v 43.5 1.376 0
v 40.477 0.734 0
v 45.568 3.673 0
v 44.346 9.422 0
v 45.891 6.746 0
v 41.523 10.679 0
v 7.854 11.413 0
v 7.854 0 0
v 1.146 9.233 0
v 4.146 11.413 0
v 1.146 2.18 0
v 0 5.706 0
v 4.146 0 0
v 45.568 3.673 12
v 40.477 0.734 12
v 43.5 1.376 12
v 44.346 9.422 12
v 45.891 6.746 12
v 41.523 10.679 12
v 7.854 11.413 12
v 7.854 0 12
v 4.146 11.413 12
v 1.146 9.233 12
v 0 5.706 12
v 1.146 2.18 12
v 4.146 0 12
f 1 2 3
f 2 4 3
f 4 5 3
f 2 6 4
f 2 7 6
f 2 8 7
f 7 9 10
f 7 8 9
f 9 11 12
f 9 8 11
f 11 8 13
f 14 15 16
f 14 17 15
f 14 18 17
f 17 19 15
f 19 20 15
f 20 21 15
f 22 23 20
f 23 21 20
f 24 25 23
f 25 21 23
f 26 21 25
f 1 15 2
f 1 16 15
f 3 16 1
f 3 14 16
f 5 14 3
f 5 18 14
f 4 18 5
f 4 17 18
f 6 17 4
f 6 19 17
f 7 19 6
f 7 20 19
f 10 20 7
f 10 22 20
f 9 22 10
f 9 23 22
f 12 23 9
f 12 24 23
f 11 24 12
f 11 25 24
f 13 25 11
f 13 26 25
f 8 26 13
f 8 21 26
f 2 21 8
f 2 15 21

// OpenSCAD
$fn = 32;

// ----------------------------------------------------------------------
// Lever arm: two bosses 12 and 10 mm, 35 mm between centres
// ----------------------------------------------------------------------

// --- parameters (mm) ---
profile_height = 12;      // extrusion height
profile_points = 13;      // points of the closed outline

profile = [[0, 5.706], [1.146, 2.18], [4.146, 0], [7.854, 0], [40.477, 0.734], [43.5, 1.376], [45.568, 3.673], [45.891, 6.746], [44.346, 9.422], [41.523, 10.679], [7.854, 11.413], [4.146, 11.413], [1.146, 9.233]];  // single closed polygon, 13 points, counter clockwise

// --- the one profile operation ---
linear_extrude(height = profile_height) polygon(points = profile);
